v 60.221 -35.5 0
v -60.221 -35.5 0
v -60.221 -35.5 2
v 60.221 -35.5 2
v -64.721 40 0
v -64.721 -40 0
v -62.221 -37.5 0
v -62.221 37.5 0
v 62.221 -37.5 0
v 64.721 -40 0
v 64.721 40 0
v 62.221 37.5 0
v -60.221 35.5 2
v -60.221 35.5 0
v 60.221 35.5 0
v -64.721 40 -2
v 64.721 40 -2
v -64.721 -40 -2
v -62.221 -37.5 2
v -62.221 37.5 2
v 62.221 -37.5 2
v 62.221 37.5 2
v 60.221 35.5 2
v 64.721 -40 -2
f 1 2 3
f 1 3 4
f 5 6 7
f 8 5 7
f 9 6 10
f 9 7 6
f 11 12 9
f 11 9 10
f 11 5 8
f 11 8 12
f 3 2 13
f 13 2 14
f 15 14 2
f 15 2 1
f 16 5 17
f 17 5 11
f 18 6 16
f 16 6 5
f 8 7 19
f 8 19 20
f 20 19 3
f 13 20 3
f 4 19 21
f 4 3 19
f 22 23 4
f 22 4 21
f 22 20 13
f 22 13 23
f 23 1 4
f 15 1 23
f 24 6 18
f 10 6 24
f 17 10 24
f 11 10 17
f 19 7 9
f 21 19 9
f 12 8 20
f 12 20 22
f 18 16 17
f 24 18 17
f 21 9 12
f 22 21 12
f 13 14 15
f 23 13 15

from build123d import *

# Parameters (mm, degrees)
F0_W     = 129.44272
F0_H     = 80
F1_DEPTH = 2
F2_W     = 124.44272
F2_H     = 75
F2_W_2   = 120.44272
F2_H_2   = 71
F3_DEPTH = 2


with BuildPart() as f1:
    # F0 (on Top) → F1 (new body)
    with BuildSketch(Plane.XY):
        Rectangle(F0_W, F0_H)
    extrude(amount=-F1_DEPTH)

    # F2 (on Top) → F3 (join)
    with BuildSketch(Plane.XY):
        Rectangle(F2_W, F2_H)
        Rectangle(F2_W_2, F2_H_2, mode=Mode.SUBTRACT)
    extrude(amount=F3_DEPTH)


solid = f1.part
